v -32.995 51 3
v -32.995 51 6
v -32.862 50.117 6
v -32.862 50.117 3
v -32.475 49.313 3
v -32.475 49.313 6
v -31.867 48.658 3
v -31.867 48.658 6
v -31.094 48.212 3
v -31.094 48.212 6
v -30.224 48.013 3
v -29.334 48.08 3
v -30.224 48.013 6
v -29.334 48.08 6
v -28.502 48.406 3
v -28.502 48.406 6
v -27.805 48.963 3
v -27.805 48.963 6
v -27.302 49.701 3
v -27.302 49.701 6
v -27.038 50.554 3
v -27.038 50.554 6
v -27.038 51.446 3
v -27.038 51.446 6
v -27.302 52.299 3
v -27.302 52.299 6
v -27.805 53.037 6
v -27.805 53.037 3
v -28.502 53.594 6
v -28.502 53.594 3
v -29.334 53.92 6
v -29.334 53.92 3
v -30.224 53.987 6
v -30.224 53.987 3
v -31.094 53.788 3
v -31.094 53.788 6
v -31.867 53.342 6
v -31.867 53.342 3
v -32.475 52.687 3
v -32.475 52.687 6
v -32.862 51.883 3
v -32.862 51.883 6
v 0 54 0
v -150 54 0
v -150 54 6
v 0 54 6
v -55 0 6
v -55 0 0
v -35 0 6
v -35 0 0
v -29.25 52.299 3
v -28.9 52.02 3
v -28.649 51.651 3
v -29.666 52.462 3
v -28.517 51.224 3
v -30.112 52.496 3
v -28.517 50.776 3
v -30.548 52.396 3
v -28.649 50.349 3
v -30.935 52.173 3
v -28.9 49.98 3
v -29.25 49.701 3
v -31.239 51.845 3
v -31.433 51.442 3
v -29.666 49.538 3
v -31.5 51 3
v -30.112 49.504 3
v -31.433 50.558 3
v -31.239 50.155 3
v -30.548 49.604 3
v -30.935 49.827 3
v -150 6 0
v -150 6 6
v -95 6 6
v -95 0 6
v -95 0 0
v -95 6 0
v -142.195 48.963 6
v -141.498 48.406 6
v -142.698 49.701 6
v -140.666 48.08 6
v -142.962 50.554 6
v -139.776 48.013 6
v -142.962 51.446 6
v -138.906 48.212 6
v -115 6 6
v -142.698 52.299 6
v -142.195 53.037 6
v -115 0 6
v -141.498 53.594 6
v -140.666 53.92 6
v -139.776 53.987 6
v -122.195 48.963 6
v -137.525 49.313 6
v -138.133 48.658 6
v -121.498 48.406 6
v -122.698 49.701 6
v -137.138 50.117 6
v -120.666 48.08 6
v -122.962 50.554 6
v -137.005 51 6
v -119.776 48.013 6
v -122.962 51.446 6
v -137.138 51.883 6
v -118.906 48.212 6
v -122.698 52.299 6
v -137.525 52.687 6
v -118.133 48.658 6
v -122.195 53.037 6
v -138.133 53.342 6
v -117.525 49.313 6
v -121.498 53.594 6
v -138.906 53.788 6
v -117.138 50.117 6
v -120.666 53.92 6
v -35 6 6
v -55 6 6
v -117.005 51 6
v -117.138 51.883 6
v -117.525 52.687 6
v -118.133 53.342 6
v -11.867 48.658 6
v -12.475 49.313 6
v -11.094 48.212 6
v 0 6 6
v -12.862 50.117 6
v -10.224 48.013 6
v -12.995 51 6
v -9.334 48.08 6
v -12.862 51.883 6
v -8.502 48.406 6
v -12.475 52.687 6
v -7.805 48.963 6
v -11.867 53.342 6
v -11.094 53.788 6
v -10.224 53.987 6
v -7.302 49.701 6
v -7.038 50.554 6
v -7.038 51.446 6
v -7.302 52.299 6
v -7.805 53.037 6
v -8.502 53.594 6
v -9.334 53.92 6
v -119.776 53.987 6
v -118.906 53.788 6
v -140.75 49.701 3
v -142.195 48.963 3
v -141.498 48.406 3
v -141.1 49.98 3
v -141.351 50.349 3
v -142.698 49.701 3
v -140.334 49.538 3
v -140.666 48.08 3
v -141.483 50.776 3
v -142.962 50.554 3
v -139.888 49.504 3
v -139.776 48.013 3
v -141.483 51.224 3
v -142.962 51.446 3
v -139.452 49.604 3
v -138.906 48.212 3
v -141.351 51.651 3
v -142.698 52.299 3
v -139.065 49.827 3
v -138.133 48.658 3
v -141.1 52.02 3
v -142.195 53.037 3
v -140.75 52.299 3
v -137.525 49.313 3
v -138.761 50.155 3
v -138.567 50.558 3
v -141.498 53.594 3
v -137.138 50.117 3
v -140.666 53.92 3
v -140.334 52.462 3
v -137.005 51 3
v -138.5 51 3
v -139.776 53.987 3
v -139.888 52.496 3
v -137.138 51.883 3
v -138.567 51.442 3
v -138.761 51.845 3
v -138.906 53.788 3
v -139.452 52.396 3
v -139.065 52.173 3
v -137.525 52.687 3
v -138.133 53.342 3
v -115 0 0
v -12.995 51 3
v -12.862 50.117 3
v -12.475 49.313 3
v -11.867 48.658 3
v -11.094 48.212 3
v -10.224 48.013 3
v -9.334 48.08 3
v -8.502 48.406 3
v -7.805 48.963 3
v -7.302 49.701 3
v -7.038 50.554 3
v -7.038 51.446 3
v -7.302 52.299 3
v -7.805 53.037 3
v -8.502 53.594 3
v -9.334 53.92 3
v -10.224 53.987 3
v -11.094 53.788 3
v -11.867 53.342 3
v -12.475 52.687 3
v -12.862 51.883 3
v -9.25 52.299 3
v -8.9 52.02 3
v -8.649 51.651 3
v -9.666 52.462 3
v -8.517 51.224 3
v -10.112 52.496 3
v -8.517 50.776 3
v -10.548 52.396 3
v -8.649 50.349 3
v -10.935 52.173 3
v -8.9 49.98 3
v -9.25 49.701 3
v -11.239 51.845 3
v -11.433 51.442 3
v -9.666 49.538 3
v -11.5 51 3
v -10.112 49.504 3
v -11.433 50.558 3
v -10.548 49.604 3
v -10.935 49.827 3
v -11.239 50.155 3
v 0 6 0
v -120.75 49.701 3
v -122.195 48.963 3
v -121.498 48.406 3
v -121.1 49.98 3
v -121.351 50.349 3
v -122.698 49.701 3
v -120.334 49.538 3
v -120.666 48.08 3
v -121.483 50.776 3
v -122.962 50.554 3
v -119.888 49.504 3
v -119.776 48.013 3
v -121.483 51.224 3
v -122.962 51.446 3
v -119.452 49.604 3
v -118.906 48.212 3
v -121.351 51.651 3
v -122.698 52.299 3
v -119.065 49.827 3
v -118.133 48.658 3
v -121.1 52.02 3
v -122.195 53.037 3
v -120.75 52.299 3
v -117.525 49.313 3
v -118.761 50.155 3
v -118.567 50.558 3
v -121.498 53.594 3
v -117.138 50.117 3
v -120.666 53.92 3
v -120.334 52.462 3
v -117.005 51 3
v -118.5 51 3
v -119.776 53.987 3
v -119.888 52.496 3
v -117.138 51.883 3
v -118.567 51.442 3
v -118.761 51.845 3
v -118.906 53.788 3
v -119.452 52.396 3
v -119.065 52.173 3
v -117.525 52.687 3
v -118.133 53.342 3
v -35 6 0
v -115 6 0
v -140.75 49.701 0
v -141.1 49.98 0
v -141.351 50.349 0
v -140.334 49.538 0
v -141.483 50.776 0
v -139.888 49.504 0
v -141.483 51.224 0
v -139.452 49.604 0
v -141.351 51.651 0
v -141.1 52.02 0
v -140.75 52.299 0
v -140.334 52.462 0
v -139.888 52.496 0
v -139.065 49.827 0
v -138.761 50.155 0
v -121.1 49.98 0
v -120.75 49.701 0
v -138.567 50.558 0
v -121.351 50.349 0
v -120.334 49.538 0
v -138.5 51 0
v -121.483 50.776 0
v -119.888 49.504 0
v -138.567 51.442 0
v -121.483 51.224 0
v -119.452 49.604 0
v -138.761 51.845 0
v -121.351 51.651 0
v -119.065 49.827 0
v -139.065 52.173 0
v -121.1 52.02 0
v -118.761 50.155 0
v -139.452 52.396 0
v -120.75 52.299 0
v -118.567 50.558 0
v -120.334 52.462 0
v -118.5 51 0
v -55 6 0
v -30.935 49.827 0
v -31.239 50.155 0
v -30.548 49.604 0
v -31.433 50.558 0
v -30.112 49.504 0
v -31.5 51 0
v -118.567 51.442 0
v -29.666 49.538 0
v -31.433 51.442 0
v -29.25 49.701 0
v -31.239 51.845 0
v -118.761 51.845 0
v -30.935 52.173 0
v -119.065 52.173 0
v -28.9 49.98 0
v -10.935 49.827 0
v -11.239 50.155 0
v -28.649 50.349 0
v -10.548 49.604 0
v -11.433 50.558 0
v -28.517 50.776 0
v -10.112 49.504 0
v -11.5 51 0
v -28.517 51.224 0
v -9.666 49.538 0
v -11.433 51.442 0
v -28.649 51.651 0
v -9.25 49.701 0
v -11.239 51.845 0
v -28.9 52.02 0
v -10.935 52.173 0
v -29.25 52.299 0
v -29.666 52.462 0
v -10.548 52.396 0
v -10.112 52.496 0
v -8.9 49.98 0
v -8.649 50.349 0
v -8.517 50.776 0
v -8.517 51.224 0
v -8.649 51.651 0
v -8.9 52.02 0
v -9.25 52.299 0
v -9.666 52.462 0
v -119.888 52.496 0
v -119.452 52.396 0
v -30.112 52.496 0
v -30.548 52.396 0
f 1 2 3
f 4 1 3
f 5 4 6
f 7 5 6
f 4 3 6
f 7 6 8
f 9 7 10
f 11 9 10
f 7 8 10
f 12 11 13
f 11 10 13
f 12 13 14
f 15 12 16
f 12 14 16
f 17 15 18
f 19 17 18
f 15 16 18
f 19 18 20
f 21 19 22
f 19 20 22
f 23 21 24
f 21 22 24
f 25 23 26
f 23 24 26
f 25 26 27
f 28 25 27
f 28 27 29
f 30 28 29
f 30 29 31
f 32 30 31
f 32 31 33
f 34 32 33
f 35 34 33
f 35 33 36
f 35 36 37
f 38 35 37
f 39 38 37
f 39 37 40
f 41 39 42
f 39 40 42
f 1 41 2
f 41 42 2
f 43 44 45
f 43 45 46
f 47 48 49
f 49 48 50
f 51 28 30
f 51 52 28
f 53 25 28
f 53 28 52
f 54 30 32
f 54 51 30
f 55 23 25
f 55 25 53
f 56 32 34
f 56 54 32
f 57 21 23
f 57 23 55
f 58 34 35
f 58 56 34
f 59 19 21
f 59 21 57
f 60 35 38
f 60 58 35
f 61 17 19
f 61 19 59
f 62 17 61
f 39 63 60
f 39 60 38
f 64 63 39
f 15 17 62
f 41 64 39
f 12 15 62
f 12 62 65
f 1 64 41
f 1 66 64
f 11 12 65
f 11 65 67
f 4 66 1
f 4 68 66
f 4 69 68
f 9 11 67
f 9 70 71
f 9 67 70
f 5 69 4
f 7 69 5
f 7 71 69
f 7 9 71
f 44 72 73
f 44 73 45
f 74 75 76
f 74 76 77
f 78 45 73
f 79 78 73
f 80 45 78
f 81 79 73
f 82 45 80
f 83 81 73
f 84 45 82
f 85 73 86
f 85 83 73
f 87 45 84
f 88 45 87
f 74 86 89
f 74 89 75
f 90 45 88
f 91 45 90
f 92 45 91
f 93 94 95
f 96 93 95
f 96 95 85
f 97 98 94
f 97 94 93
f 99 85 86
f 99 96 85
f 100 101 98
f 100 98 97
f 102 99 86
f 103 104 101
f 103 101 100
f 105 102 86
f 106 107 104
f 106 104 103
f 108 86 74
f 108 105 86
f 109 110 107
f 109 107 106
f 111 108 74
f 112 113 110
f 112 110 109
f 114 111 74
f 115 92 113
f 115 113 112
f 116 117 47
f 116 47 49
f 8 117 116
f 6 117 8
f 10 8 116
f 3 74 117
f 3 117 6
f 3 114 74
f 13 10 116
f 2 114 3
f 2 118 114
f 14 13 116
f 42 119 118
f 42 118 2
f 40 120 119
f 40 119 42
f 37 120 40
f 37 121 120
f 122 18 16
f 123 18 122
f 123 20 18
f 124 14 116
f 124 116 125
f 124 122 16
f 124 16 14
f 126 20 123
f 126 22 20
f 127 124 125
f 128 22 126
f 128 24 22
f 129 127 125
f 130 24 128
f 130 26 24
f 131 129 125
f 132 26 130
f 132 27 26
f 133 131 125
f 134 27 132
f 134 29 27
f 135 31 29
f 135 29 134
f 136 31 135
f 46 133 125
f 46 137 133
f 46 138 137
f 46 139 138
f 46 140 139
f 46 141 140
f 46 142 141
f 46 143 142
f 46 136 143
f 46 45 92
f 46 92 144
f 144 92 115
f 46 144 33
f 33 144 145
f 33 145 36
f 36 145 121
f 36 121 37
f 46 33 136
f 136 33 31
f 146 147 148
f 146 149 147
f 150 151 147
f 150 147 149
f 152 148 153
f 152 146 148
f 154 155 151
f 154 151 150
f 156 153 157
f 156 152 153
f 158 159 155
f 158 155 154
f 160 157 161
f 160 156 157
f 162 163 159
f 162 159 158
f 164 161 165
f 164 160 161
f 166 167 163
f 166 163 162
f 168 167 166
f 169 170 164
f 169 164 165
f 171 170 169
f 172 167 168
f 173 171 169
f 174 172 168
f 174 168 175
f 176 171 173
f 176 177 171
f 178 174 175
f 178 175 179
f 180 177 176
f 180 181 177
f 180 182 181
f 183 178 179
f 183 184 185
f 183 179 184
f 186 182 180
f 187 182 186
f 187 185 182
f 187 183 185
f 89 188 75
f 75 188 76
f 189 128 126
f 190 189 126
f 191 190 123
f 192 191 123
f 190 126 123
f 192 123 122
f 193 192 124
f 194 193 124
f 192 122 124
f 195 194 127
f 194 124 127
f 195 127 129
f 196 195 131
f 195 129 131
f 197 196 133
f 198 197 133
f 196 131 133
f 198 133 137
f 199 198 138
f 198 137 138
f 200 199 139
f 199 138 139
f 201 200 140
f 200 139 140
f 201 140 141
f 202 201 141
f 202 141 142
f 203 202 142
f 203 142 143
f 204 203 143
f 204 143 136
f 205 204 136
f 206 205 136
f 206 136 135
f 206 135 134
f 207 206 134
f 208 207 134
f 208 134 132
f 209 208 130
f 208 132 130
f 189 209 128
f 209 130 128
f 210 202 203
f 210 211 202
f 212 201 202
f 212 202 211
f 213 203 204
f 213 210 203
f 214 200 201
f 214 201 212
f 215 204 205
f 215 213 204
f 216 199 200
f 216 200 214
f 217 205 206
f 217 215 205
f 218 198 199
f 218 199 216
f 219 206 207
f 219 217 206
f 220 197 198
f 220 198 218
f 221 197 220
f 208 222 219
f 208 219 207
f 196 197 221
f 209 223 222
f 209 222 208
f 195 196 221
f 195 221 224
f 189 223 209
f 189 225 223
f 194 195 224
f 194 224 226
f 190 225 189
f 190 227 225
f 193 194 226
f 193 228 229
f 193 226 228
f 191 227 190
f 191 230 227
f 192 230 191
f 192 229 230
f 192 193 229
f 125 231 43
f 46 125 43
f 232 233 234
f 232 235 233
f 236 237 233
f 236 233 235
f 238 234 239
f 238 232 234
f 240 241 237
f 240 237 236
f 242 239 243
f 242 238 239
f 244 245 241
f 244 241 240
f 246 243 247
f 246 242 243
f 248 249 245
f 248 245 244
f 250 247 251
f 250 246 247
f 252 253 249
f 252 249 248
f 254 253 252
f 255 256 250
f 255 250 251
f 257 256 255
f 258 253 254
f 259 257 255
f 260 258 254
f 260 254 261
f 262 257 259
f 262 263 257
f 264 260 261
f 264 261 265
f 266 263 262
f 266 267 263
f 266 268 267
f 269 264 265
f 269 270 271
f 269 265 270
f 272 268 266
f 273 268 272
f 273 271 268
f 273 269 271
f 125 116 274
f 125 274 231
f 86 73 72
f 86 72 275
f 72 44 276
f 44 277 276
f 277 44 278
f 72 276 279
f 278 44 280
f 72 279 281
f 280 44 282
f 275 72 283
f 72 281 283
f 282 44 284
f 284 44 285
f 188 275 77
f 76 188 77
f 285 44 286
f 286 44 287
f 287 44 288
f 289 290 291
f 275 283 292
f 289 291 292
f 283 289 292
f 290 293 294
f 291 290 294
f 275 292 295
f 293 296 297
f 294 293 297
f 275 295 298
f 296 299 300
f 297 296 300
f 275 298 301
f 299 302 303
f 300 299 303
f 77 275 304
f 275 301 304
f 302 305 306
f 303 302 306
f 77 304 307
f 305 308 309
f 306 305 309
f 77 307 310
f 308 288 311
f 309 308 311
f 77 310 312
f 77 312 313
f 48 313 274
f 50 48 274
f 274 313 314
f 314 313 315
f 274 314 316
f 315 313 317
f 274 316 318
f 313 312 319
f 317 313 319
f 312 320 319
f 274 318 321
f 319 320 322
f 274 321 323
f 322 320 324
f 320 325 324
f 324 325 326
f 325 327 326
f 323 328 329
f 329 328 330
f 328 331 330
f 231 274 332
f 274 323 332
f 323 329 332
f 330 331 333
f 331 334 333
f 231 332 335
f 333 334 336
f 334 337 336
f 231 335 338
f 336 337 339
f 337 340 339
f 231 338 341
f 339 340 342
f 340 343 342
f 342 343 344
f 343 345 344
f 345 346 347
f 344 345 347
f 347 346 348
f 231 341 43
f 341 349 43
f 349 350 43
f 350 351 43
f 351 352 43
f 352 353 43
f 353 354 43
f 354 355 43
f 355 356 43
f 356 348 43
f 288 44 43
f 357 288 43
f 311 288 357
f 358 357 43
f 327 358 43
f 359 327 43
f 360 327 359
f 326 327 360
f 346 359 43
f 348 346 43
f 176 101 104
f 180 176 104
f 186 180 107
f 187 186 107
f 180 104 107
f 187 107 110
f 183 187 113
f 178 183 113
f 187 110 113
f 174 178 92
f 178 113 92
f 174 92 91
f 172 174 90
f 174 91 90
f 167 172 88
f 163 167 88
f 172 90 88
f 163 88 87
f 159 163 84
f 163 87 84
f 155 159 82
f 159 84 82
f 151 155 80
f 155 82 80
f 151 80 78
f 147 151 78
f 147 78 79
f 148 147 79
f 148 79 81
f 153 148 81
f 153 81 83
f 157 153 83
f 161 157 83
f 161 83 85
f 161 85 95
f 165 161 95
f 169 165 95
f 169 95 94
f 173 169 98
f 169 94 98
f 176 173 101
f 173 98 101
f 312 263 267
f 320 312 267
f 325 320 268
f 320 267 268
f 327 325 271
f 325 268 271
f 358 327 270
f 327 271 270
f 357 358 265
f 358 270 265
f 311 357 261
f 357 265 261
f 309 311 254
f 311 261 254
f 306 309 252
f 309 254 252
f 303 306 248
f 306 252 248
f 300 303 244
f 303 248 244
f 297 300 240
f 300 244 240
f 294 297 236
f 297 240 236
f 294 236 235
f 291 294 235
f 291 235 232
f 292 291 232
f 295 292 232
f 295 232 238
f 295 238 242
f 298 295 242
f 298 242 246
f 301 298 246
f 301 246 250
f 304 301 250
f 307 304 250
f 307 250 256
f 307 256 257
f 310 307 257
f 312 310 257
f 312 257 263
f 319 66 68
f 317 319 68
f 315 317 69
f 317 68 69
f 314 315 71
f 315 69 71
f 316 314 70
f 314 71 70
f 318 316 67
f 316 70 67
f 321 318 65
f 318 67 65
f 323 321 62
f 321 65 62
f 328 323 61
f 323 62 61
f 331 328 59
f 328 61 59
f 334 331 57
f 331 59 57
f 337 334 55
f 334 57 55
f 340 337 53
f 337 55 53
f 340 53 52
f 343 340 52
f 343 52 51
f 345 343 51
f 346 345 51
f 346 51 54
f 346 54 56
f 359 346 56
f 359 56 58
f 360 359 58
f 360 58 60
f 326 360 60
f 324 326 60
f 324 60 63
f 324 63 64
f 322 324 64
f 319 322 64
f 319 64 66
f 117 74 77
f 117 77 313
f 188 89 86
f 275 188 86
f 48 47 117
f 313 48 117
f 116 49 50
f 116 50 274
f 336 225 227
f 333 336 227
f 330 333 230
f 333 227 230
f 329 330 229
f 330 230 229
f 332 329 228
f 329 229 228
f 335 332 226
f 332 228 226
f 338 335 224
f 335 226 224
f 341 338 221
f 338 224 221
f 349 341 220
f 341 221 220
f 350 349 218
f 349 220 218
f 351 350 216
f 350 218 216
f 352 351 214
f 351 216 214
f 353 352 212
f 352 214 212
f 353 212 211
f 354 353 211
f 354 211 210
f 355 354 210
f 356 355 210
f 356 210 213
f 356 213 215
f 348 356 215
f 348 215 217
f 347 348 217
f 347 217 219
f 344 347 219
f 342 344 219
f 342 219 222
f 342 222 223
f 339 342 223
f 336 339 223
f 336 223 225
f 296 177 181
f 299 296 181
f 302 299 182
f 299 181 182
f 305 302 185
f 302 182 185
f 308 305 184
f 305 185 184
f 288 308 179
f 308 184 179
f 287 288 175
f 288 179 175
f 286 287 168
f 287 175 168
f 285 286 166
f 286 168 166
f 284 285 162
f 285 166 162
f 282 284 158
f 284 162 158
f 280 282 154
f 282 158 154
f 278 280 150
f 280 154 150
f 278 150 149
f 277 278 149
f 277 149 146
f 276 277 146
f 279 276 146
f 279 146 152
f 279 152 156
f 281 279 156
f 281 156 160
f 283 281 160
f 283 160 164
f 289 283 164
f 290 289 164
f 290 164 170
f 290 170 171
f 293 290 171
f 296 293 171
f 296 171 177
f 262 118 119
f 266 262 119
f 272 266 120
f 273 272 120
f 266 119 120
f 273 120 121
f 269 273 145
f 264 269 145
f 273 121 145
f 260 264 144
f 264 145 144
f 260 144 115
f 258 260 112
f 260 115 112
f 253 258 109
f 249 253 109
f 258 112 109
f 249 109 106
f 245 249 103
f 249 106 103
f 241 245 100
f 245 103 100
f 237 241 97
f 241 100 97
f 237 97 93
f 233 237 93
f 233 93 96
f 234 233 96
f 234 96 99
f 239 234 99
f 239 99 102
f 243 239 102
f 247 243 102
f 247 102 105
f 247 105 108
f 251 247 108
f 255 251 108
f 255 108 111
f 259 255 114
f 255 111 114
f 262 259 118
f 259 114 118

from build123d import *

# Parameters (mm, degrees)
ESQUISSE1_W             = 150
ESQUISSE1_H             = 54
BOSS_EXTRU_1_DEPTH      = 6
ESQUISSE2_W             = 35
ESQUISSE2_H             = 6
ESQUISSE2_W_2           = 40
ENL_V_MAT_EXTRU_1_DEPTH = 160.536829604
ESQUISSE4_R             = 1.5
ENL_V_MAT_EXTRU_3_DEPTH = 6
ESQUISSE5_R             = 2.995
ENL_V_MAT_EXTRU_4_DEPTH = 3


with BuildPart() as part:
    # Esquisse1 → Boss.-Extru.1 (new body)
    with BuildSketch(Plane.XY):
        with Locations((-75, 27)):
            Rectangle(ESQUISSE1_W, ESQUISSE1_H)
    extrude(amount=BOSS_EXTRU_1_DEPTH)

    # Esquisse2 → Enlèv. mat.-Extru.1 (cut, through all)
    with BuildSketch(Plane.XY.offset(6)):
        with Locations((-17.5, 3)):
            Rectangle(ESQUISSE2_W, ESQUISSE2_H)
        with Locations((-75, 3)):
            Rectangle(ESQUISSE2_W_2, ESQUISSE2_H)
        with Locations((-132.5, 3)):
            Rectangle(ESQUISSE2_W, ESQUISSE2_H)
    extrude(amount=-ENL_V_MAT_EXTRU_1_DEPTH, mode=Mode.SUBTRACT)

    # Esquisse4 → Enlèv. mat.-Extru.3 (cut)
    with BuildSketch(Plane.XY.offset(6)):
        with Locations((-140, 51)):
            Circle(ESQUISSE4_R)
        with Locations((-120, 51)):
            Circle(ESQUISSE4_R)
        with Locations(Location((-30, 51, 0), (0, 0, 180))):
            Circle(ESQUISSE4_R)
        with Locations(Location((-10, 51, 0), (0, 0, 180))):
            Circle(ESQUISSE4_R)
    extrude(amount=-ENL_V_MAT_EXTRU_3_DEPTH, mode=Mode.SUBTRACT)

    # Esquisse5 → Enlèv. mat.-Extru.4 (cut)
    with BuildSketch(Plane.XY.offset(6)):
        with Locations((-140, 51)):
            Circle(ESQUISSE5_R)
        with Locations((-120, 51)):
            Circle(ESQUISSE5_R)
        with Locations(Location((-30, 51, 0), (0, 0, 180))):
            Circle(ESQUISSE5_R)
        with Locations(Location((-10, 51, 0), (0, 0, 180))):
            Circle(ESQUISSE5_R)
    extrude(amount=-ENL_V_MAT_EXTRU_4_DEPTH, mode=Mode.SUBTRACT)


solid = part.part
